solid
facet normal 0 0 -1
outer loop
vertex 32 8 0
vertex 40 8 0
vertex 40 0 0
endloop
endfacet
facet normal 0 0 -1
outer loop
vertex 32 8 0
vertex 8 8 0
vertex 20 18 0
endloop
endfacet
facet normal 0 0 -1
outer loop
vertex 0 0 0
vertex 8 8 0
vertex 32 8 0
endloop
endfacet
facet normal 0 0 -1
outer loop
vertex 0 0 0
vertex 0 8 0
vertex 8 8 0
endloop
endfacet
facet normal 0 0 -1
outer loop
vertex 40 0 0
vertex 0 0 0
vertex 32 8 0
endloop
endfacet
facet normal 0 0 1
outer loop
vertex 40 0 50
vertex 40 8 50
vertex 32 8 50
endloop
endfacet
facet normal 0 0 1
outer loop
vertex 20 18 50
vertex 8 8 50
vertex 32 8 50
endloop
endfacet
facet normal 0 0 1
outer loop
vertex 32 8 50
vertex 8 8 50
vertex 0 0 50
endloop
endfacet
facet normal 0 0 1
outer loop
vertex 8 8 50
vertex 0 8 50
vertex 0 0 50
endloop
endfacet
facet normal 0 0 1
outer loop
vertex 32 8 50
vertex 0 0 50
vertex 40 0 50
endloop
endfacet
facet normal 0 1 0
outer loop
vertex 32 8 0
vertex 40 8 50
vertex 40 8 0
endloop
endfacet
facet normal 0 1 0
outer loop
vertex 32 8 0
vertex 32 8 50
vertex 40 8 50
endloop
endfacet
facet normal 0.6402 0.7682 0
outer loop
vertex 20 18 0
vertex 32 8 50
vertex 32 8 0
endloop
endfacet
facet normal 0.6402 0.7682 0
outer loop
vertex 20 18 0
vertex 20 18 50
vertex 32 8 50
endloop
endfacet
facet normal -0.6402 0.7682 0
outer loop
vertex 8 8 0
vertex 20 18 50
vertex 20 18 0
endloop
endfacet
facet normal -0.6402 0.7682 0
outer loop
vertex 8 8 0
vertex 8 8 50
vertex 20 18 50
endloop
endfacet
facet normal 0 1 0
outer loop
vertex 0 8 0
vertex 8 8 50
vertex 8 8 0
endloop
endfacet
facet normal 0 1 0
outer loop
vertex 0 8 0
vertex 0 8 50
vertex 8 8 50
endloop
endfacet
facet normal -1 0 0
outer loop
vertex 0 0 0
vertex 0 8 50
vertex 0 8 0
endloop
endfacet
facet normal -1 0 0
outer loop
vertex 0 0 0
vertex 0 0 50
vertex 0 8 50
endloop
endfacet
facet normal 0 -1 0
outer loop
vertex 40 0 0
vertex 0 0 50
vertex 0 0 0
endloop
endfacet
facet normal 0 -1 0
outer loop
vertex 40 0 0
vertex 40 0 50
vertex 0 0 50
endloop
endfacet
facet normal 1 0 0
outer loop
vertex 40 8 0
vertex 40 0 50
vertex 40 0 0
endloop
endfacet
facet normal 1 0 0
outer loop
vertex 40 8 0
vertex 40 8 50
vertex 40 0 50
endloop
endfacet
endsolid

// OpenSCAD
$fn = 32;

// ----------------------------------------------------------------------
// V guide rail: vrib, 40 mm wide
// ----------------------------------------------------------------------

// --- parameters (mm) ---
rail_w = 40;              // rail width, X
base_t = 8;               // base plate thickness
v_depth = 10;             // V feature depth / height
v_half_w = 12;            // half width of the V at the base face
plate_t = 50;             // rail length, Z (the extrusion height)

profile = [[0, 0], [40, 0], [40, 8], [32, 8], [20, 18], [8, 8], [0, 8]];  // primary outline, 7 points, counter clockwise

// --- the one profile operation ---
linear_extrude(height = plate_t) polygon(points = profile);
